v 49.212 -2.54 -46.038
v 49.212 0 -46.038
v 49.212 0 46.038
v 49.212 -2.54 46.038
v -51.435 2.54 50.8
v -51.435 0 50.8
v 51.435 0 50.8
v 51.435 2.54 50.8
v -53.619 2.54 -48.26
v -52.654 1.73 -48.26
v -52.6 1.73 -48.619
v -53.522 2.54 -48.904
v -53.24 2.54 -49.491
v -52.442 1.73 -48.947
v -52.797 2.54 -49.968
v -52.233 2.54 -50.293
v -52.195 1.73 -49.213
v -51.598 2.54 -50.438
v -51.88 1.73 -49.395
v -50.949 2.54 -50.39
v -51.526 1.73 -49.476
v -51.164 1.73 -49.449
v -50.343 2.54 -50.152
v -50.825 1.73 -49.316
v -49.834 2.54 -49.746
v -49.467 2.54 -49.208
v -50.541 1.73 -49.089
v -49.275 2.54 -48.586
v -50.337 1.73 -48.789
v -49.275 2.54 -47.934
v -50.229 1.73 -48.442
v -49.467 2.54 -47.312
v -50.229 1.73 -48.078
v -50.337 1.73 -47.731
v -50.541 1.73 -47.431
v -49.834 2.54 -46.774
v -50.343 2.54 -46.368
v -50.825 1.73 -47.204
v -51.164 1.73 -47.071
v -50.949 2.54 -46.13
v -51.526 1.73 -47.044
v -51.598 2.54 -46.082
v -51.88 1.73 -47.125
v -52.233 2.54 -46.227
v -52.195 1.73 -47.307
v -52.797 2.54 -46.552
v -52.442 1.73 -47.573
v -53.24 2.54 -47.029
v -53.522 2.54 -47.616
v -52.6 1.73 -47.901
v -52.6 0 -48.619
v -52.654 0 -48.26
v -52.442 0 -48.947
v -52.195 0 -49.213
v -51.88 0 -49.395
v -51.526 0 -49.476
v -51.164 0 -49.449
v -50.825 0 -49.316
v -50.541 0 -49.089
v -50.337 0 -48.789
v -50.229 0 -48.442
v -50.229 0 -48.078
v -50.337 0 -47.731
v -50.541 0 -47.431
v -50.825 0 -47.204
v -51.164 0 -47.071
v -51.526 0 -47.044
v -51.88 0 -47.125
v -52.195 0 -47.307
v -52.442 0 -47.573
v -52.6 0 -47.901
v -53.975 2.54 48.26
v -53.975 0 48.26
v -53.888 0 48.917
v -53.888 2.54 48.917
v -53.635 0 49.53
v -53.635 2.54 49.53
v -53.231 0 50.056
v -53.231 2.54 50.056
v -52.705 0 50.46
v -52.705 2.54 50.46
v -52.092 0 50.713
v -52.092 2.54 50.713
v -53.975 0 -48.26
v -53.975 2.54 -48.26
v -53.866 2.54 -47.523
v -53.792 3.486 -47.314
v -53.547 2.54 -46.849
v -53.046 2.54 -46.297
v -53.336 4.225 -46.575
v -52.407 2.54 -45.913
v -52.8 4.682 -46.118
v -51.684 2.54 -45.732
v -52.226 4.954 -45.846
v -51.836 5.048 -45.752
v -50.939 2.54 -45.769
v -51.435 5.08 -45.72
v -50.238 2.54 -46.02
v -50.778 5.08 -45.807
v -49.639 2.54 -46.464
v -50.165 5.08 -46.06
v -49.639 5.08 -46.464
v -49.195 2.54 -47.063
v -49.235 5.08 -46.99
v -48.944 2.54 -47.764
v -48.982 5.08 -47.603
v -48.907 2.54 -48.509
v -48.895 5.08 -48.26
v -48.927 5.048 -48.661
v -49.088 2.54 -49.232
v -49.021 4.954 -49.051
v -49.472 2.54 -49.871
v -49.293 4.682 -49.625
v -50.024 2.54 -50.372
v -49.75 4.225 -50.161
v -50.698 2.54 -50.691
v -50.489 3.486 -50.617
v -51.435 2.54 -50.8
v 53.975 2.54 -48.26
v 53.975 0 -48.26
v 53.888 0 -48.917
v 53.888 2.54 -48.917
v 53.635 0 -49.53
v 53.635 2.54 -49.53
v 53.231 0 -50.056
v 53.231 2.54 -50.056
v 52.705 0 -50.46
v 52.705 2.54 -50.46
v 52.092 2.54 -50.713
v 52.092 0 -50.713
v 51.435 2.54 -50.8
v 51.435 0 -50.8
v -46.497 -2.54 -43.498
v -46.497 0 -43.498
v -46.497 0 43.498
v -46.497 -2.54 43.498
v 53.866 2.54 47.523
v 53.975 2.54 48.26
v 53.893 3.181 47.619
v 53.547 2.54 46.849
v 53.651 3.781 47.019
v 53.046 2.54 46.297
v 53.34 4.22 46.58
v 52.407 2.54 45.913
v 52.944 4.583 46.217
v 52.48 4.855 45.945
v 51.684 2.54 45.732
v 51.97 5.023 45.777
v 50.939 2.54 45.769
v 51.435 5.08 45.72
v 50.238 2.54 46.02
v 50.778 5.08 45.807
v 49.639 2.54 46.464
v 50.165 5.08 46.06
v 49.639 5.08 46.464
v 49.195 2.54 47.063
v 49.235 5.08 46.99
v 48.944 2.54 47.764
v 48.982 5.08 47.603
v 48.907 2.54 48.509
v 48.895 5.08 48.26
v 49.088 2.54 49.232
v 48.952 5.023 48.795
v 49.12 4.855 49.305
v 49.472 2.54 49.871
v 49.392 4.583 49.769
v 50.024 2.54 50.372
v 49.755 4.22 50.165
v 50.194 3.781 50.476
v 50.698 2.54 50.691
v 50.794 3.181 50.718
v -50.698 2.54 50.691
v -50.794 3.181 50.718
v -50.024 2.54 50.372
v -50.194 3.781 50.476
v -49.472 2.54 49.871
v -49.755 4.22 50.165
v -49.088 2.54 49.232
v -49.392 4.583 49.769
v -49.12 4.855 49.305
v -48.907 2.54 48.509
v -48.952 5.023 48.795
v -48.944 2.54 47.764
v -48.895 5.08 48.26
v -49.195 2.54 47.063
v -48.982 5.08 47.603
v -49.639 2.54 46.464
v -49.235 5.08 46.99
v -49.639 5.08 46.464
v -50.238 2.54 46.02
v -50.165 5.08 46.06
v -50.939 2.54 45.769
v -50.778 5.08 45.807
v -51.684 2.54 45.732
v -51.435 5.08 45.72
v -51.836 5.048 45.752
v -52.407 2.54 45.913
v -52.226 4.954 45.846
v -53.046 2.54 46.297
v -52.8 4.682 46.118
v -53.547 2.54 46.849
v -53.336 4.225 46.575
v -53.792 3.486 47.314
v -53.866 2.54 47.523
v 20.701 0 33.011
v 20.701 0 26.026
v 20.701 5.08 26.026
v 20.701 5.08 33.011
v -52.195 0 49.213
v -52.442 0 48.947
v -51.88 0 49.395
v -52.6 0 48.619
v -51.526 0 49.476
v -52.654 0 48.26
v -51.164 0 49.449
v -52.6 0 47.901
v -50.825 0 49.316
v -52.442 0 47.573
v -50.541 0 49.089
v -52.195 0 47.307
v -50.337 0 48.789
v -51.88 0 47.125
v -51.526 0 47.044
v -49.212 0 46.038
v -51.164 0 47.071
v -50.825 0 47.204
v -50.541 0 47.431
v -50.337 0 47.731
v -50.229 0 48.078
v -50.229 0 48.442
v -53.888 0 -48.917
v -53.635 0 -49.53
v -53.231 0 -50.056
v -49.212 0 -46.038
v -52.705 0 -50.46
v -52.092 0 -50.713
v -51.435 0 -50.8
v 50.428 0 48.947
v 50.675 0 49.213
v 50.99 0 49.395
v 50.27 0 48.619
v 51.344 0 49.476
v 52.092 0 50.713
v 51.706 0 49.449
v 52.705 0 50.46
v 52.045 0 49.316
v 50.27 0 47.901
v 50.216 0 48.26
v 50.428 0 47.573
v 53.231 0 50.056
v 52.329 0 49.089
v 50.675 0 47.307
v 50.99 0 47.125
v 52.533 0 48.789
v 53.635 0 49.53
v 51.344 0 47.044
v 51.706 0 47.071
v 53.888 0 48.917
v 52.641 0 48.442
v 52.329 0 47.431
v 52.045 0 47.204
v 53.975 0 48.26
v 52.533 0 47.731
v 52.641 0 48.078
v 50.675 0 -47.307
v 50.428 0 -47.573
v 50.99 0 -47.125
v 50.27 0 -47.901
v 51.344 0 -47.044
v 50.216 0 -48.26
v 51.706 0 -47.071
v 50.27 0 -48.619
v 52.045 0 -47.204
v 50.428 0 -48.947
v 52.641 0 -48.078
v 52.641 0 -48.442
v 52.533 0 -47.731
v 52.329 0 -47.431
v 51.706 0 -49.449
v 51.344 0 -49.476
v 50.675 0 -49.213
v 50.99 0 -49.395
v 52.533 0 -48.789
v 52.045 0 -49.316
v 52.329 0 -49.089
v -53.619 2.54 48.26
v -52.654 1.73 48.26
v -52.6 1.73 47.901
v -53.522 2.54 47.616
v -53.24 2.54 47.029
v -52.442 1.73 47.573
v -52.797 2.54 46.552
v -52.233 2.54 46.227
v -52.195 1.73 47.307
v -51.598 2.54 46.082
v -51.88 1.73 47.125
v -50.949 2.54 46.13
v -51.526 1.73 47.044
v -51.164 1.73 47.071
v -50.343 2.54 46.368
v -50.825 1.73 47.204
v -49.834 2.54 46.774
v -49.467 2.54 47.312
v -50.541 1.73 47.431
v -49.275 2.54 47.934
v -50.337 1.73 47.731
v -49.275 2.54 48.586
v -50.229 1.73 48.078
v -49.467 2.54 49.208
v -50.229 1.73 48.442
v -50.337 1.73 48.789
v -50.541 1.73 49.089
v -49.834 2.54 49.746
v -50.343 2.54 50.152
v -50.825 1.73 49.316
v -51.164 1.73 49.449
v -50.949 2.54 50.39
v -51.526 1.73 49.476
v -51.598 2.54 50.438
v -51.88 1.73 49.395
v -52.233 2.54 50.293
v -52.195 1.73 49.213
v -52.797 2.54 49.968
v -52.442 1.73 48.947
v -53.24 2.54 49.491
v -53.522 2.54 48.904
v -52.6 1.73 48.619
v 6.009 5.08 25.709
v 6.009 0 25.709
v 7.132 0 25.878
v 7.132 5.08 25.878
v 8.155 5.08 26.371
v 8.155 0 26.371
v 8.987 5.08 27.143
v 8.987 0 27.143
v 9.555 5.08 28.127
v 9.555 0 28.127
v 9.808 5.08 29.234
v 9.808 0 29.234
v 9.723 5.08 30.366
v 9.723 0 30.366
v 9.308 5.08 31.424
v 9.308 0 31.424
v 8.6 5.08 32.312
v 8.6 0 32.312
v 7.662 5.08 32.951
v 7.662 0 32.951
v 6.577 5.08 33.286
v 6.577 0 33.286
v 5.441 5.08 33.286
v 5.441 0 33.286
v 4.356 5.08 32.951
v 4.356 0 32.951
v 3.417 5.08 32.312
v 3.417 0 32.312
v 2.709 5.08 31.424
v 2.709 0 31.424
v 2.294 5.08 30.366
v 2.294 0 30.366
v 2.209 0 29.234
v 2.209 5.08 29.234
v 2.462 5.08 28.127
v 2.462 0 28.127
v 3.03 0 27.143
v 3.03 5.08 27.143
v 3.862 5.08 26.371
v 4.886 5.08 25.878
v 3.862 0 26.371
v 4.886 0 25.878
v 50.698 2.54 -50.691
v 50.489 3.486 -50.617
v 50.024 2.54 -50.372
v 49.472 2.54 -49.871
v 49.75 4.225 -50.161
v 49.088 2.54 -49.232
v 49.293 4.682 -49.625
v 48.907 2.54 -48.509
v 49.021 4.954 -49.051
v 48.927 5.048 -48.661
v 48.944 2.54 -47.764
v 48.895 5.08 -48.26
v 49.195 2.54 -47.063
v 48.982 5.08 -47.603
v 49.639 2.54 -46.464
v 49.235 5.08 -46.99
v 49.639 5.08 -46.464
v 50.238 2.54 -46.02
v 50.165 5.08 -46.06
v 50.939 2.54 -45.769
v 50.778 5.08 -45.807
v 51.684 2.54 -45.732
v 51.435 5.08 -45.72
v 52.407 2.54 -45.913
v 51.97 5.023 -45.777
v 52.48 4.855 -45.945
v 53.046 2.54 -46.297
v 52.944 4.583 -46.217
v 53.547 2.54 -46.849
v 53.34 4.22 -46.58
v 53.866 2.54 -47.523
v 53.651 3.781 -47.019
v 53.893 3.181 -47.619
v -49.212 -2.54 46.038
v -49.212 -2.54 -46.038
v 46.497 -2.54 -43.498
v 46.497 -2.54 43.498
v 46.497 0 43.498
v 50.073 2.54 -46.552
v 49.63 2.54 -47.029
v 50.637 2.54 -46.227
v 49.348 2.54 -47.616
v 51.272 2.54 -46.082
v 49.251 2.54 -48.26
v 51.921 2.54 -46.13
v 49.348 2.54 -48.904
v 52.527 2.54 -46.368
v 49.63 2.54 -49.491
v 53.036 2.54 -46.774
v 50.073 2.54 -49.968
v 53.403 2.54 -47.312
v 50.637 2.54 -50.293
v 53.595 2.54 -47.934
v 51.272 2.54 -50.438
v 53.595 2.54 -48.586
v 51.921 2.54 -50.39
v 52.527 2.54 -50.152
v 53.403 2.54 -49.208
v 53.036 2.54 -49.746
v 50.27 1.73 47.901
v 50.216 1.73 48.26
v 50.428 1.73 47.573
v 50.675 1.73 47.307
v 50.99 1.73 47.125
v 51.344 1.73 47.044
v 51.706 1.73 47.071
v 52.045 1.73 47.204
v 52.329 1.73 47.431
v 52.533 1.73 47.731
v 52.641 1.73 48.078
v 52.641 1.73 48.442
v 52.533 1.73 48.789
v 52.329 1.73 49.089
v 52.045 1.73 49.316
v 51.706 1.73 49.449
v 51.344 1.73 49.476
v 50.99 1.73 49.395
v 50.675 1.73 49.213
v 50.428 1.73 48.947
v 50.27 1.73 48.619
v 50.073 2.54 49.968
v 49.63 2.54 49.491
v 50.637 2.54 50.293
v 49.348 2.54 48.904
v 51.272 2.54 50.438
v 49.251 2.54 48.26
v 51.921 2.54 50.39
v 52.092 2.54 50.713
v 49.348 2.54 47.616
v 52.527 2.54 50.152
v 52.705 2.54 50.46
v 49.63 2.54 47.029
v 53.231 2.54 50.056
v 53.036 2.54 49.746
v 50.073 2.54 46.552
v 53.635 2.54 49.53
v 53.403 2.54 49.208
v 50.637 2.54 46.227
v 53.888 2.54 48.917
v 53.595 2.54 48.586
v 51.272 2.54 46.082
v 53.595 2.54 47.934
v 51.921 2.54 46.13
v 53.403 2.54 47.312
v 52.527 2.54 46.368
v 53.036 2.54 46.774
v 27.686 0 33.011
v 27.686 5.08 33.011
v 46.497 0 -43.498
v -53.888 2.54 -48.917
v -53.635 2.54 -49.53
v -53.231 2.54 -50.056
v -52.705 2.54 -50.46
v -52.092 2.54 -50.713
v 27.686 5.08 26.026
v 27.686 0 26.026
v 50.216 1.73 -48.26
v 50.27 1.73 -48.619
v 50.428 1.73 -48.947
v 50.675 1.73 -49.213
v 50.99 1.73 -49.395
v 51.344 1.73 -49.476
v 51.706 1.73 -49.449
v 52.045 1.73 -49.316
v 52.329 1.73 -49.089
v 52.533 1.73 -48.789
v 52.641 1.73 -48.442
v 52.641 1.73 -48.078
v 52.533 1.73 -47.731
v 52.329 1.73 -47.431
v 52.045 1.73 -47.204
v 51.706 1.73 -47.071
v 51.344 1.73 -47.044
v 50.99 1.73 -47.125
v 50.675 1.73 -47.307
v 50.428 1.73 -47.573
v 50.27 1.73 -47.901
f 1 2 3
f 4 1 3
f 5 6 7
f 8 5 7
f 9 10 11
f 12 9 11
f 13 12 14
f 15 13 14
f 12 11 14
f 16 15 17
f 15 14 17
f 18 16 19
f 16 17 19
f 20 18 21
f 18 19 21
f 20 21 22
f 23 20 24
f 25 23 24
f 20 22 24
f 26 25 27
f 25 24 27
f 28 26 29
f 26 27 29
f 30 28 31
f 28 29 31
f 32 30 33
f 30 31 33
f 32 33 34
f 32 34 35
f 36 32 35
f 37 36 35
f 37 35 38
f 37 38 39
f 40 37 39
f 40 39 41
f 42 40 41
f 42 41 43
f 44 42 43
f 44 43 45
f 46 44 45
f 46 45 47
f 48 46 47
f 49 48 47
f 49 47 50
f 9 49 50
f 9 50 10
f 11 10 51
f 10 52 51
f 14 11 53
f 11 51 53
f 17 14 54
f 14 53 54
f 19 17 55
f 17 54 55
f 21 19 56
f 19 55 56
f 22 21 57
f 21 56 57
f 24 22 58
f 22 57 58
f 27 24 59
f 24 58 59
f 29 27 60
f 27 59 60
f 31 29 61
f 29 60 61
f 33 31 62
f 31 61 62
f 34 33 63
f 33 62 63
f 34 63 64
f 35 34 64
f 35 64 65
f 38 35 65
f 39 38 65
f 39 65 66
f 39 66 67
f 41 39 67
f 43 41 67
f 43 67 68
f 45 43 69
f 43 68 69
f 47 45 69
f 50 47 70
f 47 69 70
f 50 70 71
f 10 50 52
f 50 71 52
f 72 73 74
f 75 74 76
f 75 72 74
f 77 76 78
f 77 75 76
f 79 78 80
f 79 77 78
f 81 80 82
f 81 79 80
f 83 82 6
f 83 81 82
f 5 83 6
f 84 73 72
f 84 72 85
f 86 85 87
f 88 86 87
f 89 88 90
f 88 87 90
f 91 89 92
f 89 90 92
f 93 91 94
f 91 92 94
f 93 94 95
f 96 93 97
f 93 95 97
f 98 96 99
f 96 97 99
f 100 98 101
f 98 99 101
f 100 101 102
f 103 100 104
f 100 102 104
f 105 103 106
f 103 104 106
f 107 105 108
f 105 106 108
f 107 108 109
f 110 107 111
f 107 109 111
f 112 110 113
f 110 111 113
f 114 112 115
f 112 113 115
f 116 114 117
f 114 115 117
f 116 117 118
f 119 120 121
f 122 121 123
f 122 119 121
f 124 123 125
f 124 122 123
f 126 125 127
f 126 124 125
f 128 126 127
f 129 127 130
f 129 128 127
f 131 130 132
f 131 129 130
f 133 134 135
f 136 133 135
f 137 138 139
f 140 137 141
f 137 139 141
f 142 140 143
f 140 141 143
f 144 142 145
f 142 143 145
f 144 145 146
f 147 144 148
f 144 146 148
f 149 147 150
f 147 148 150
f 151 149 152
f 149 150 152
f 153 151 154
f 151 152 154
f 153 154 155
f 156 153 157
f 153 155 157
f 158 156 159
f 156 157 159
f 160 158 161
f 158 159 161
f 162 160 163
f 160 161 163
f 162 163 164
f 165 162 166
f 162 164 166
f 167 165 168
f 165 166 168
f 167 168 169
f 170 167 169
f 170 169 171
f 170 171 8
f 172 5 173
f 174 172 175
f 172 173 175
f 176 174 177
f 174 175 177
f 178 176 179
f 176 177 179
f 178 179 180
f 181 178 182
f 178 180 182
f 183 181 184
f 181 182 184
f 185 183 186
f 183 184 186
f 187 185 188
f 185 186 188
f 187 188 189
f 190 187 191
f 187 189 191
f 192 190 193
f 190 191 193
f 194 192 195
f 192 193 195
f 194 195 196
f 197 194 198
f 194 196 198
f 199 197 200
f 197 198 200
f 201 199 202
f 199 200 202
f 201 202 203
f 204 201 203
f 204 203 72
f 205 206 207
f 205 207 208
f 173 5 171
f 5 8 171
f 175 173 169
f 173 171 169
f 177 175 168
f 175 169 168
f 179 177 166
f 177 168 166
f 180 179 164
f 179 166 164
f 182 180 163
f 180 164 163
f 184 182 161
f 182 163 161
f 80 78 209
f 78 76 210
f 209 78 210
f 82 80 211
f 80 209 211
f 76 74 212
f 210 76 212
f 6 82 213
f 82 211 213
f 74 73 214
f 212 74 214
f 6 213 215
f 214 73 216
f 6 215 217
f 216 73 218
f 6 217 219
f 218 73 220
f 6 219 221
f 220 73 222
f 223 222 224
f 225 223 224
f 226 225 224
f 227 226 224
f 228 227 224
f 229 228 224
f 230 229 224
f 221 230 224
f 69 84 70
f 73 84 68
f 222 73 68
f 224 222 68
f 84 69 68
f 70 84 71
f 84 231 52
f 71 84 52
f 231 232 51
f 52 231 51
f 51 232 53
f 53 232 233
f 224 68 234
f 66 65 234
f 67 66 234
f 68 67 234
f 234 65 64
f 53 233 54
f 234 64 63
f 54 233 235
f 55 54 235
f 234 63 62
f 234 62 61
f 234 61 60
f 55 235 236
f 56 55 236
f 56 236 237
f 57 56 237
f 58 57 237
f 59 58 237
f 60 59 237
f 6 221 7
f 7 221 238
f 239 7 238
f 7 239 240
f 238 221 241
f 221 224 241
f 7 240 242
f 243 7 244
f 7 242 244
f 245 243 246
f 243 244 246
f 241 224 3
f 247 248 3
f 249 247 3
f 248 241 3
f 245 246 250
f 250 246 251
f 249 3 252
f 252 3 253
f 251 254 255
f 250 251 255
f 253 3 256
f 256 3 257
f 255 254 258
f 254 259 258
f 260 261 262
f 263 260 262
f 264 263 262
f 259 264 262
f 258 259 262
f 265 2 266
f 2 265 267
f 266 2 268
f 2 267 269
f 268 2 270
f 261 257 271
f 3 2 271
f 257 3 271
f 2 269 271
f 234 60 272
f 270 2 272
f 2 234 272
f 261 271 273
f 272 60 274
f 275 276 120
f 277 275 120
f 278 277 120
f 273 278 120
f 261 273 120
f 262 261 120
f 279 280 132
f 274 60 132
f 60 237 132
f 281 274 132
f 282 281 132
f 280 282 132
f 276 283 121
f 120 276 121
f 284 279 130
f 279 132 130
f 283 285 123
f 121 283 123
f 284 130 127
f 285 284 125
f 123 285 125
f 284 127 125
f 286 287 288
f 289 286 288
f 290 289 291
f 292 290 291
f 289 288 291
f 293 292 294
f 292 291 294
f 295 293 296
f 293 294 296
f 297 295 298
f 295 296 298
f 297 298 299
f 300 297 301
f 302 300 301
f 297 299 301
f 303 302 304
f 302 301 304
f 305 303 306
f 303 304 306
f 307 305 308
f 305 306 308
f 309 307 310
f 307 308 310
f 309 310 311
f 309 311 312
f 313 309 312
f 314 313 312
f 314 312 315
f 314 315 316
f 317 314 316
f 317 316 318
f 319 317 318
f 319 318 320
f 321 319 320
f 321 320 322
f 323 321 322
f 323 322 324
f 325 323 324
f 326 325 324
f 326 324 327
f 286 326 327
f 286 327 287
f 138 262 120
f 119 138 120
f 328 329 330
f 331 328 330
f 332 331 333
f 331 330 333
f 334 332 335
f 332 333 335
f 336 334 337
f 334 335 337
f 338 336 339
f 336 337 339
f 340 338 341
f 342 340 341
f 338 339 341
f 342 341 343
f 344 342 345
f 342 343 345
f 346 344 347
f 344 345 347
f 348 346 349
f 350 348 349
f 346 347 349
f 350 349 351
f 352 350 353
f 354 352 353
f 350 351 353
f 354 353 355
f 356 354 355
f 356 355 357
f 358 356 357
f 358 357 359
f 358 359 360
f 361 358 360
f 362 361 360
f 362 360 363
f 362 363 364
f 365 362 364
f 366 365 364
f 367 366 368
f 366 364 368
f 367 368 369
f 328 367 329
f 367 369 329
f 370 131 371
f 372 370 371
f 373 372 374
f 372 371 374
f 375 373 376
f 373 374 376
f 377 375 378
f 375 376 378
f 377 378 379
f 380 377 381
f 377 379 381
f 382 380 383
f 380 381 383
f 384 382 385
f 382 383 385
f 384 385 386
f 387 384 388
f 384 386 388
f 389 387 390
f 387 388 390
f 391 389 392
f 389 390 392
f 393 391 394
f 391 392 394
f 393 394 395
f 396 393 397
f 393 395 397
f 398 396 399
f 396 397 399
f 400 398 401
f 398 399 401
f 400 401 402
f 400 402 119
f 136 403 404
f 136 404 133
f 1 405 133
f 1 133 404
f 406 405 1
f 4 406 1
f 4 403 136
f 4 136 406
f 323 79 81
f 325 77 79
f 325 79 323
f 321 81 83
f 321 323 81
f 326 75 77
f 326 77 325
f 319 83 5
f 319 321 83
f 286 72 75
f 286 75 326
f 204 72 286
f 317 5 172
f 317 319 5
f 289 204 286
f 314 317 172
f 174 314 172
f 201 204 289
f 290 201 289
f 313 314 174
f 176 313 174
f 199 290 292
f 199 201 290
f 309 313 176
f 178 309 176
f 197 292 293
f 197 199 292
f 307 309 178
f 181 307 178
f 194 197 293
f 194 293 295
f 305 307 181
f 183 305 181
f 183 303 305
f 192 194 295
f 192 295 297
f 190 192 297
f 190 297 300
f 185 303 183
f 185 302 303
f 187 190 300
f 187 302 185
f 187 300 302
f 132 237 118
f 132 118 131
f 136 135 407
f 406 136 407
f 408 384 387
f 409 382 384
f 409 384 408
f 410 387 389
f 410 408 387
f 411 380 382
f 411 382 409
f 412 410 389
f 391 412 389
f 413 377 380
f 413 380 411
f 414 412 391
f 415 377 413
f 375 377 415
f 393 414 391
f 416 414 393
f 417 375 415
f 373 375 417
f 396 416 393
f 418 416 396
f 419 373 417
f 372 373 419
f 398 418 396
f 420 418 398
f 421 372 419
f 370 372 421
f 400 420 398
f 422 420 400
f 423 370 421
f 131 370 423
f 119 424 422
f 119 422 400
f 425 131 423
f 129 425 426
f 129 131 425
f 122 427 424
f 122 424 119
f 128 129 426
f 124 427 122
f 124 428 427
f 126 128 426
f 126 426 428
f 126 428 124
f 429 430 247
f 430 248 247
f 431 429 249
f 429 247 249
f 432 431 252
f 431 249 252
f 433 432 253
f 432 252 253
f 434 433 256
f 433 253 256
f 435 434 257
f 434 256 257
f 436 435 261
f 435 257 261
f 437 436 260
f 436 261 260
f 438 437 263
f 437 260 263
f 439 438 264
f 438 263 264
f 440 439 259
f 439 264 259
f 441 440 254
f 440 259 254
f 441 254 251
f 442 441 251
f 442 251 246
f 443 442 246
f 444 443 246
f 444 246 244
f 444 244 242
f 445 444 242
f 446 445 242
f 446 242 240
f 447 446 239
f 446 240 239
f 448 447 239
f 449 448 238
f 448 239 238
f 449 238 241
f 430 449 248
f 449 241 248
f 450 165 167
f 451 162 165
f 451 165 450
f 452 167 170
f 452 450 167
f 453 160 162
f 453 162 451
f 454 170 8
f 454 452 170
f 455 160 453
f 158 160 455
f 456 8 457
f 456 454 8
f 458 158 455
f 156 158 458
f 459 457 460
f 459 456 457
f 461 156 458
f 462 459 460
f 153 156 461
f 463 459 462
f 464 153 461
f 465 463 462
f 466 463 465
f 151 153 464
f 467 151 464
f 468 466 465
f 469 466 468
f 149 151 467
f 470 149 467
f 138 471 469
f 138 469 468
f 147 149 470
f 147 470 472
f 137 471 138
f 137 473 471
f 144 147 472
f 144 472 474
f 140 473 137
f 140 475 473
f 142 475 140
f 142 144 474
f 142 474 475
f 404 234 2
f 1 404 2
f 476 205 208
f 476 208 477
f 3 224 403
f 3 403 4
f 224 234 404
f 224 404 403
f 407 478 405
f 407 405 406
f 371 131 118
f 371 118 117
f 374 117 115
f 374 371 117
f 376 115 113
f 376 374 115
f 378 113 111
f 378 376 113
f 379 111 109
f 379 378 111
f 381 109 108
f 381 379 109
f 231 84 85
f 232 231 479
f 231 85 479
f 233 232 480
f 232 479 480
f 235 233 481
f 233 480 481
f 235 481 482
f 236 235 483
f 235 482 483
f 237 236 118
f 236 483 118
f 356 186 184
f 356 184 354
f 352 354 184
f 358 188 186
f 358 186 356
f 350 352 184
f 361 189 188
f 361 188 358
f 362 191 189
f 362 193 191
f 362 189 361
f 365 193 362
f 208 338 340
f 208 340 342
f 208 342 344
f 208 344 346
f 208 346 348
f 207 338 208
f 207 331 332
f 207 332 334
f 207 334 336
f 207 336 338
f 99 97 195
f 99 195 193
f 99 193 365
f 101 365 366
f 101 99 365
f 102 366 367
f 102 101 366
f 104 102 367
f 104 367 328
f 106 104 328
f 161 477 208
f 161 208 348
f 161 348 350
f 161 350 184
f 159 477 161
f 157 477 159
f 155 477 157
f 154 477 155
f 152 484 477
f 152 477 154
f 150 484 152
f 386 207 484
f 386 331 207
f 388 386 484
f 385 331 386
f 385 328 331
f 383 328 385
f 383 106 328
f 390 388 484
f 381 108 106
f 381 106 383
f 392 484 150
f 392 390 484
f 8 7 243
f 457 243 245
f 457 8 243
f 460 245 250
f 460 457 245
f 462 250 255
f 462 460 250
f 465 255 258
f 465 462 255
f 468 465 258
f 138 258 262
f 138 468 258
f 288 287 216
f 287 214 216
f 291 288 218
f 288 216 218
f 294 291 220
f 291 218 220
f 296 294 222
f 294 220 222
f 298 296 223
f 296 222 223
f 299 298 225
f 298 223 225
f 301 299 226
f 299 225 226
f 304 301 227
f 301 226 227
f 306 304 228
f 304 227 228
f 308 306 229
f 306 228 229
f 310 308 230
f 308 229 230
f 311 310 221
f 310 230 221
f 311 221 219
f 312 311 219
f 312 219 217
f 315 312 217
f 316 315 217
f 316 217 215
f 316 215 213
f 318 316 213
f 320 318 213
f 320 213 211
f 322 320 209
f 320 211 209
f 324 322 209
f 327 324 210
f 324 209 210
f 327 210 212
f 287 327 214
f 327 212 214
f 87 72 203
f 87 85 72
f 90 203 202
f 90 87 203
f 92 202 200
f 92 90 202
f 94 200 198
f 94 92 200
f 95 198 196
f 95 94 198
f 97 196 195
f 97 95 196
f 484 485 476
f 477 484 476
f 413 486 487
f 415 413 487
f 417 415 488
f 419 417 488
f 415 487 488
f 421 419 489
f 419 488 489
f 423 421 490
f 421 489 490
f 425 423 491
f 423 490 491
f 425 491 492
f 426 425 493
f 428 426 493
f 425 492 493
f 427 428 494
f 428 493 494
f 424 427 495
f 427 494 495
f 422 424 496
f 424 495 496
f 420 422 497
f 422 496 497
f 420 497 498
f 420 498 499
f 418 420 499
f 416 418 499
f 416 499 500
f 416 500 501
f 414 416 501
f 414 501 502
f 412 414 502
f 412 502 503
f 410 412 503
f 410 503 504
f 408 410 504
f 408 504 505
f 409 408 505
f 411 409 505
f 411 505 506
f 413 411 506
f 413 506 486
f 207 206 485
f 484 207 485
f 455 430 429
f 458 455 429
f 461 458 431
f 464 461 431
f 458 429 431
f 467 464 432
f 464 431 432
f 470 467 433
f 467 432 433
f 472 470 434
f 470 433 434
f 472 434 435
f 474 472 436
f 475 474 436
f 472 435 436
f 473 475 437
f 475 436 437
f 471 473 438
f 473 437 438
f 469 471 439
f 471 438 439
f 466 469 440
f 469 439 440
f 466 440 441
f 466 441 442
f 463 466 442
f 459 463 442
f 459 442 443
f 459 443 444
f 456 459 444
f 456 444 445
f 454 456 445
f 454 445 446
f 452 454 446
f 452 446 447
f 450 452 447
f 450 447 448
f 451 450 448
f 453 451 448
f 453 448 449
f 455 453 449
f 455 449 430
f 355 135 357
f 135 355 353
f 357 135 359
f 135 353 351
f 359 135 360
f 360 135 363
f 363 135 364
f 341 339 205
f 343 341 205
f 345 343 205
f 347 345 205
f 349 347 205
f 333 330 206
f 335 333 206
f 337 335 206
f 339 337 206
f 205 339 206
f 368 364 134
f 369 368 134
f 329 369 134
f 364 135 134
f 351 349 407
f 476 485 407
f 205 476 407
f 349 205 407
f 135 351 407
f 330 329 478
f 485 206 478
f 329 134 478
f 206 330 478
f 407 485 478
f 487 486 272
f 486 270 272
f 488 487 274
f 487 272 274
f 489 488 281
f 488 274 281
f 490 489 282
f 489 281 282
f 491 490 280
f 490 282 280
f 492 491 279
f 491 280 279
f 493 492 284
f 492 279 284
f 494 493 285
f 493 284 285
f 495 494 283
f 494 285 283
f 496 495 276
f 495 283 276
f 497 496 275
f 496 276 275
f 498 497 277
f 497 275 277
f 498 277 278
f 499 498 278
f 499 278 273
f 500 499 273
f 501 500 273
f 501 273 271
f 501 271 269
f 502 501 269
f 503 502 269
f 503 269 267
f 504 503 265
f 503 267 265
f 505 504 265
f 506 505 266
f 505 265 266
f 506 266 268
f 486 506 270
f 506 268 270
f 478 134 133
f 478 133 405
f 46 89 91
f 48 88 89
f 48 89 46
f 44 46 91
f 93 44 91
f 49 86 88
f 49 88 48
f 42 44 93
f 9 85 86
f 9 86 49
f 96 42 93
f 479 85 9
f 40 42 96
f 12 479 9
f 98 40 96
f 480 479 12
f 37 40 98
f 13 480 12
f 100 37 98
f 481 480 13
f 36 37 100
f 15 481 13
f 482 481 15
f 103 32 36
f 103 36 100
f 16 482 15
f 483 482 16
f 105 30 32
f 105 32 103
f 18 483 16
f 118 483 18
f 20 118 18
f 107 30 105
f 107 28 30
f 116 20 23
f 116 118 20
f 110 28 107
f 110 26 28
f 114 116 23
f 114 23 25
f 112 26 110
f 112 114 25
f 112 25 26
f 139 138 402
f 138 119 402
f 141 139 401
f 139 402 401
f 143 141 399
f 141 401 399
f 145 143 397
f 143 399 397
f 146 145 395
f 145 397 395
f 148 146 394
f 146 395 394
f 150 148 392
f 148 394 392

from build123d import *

# Parameters (mm, degrees)
SKETCH1_W                                         = 107.95
SKETCH1_H                                         = 101.6
BOSS_EXTRUDE1_DEPTH                               = 5.08
FILLET1_R                                         = 2.54
SKETCH2_W                                         = 98.425
SKETCH2_H                                         = 92.075
SKETCH2_W_2                                       = 92.994655172
SKETCH2_H_2                                       = 86.995
BOSS_EXTRUDE2_DEPTH                               = 2.54
SKETCH3_R                                         = 3.81
CUT_EXTRUDE1_DEPTH                                = 5.08
SKETCH4_W                                         = 6.985
SKETCH4_H                                         = 6.985
CUT_EXTRUDE2_DEPTH                                = 5.08
SKETCH5_R                                         = 2.54
CUT_EXTRUDE3_DEPTH                                = 2.54
LPATTERN1_COUNT                                   = 2
LPATTERN1_PITCH                                   = 96.52
LPATTERN1_COUNT_DIR2                              = 2
LPATTERN1_PITCH_DIR2                              = 102.87
CSK_FOR_2_FLAT_HEAD_MACHINE_SCREW_100_D           = 2.4384
CSK_FOR_2_FLAT_HEAD_MACHINE_SCREW_100_CSINK_D     = 4.3688
CSK_FOR_2_FLAT_HEAD_MACHINE_SCREW_100_CSINK_ANGLE = 100


with BuildPart() as part:
    # Sketch1 → Boss-Extrude1 (new body)
    with BuildSketch(Plane(origin=(0, 0, 0), x_dir=(1, 0, 0), z_dir=(0, 1, 0))):
        Rectangle(SKETCH1_W, SKETCH1_H)
    extrude(amount=BOSS_EXTRUDE1_DEPTH)

    # Fillet1
    fillet1_edges = [part.edges().sort_by_distance(p)[0] for p in [
        (-53.975, 5.08, 0),
        (0, 5.08, 50.8),
        (53.975, 5.08, 0),
        (0, 5.08, -50.8),
        (53.975, 2.54, 50.8),
        (-53.975, 2.54, 50.8),
        (-53.975, 2.54, -50.8),
        (53.975, 2.54, -50.8),
    ]]
    fillet(fillet1_edges, radius=FILLET1_R)

    # Sketch2 → Boss-Extrude2 (add)
    with BuildSketch(Plane.XZ):
        Rectangle(SKETCH2_W, SKETCH2_H)
        Rectangle(SKETCH2_W_2, SKETCH2_H_2, mode=Mode.SUBTRACT)
    extrude(amount=BOSS_EXTRUDE2_DEPTH)

    # Sketch3 → Cut-Extrude1 (cut)
    with BuildSketch(Plane.XZ):
        with Locations(Location((6.008676456, 29.518648142, 0), (0, 0, 270))):
            Circle(SKETCH3_R)
    extrude(amount=-CUT_EXTRUDE1_DEPTH, mode=Mode.SUBTRACT)

    # Sketch4 → Cut-Extrude2 (cut)
    with BuildSketch(Plane.XZ):
        with Locations((24.193347407, 29.518339929)):
            Rectangle(SKETCH4_W, SKETCH4_H)
    extrude(amount=-CUT_EXTRUDE2_DEPTH, mode=Mode.SUBTRACT)

    # Sketch5 → Cut-Extrude3 (cut)
    with BuildSketch(Plane(origin=(0, 5.08, 0), x_dir=(1, 0, 0), z_dir=(0, 1, 0))):
        with Locations((-51.435, -48.26)):
            Circle(SKETCH5_R)
    cut_extrude3 = extrude(amount=-CUT_EXTRUDE3_DEPTH, mode=Mode.SUBTRACT)

    # LPattern1: Cut-Extrude3 2 × 2
    with Locations(*[(j * LPATTERN1_PITCH_DIR2, 0, -i * LPATTERN1_PITCH) for i in range(LPATTERN1_COUNT) for j in range(LPATTERN1_COUNT_DIR2) if (i, j) != (0, 0)]):
        add(cut_extrude3, mode=Mode.SUBTRACT)

    # CSK for #2 Flat Head Machine Screw (100)1 (through all)
    with Locations(Plane(origin=(0, 2.54, 0), x_dir=(1, 0, 0), z_dir=(0, 1, 0))):
        with Locations((51.435, -48.26), (-51.435, -48.26), (-51.435, 48.26), (51.435, 48.26)):
            CounterSinkHole(CSK_FOR_2_FLAT_HEAD_MACHINE_SCREW_100_D / 2, CSK_FOR_2_FLAT_HEAD_MACHINE_SCREW_100_CSINK_D / 2, counter_sink_angle=CSK_FOR_2_FLAT_HEAD_MACHINE_SCREW_100_CSINK_ANGLE)


solid = part.part
